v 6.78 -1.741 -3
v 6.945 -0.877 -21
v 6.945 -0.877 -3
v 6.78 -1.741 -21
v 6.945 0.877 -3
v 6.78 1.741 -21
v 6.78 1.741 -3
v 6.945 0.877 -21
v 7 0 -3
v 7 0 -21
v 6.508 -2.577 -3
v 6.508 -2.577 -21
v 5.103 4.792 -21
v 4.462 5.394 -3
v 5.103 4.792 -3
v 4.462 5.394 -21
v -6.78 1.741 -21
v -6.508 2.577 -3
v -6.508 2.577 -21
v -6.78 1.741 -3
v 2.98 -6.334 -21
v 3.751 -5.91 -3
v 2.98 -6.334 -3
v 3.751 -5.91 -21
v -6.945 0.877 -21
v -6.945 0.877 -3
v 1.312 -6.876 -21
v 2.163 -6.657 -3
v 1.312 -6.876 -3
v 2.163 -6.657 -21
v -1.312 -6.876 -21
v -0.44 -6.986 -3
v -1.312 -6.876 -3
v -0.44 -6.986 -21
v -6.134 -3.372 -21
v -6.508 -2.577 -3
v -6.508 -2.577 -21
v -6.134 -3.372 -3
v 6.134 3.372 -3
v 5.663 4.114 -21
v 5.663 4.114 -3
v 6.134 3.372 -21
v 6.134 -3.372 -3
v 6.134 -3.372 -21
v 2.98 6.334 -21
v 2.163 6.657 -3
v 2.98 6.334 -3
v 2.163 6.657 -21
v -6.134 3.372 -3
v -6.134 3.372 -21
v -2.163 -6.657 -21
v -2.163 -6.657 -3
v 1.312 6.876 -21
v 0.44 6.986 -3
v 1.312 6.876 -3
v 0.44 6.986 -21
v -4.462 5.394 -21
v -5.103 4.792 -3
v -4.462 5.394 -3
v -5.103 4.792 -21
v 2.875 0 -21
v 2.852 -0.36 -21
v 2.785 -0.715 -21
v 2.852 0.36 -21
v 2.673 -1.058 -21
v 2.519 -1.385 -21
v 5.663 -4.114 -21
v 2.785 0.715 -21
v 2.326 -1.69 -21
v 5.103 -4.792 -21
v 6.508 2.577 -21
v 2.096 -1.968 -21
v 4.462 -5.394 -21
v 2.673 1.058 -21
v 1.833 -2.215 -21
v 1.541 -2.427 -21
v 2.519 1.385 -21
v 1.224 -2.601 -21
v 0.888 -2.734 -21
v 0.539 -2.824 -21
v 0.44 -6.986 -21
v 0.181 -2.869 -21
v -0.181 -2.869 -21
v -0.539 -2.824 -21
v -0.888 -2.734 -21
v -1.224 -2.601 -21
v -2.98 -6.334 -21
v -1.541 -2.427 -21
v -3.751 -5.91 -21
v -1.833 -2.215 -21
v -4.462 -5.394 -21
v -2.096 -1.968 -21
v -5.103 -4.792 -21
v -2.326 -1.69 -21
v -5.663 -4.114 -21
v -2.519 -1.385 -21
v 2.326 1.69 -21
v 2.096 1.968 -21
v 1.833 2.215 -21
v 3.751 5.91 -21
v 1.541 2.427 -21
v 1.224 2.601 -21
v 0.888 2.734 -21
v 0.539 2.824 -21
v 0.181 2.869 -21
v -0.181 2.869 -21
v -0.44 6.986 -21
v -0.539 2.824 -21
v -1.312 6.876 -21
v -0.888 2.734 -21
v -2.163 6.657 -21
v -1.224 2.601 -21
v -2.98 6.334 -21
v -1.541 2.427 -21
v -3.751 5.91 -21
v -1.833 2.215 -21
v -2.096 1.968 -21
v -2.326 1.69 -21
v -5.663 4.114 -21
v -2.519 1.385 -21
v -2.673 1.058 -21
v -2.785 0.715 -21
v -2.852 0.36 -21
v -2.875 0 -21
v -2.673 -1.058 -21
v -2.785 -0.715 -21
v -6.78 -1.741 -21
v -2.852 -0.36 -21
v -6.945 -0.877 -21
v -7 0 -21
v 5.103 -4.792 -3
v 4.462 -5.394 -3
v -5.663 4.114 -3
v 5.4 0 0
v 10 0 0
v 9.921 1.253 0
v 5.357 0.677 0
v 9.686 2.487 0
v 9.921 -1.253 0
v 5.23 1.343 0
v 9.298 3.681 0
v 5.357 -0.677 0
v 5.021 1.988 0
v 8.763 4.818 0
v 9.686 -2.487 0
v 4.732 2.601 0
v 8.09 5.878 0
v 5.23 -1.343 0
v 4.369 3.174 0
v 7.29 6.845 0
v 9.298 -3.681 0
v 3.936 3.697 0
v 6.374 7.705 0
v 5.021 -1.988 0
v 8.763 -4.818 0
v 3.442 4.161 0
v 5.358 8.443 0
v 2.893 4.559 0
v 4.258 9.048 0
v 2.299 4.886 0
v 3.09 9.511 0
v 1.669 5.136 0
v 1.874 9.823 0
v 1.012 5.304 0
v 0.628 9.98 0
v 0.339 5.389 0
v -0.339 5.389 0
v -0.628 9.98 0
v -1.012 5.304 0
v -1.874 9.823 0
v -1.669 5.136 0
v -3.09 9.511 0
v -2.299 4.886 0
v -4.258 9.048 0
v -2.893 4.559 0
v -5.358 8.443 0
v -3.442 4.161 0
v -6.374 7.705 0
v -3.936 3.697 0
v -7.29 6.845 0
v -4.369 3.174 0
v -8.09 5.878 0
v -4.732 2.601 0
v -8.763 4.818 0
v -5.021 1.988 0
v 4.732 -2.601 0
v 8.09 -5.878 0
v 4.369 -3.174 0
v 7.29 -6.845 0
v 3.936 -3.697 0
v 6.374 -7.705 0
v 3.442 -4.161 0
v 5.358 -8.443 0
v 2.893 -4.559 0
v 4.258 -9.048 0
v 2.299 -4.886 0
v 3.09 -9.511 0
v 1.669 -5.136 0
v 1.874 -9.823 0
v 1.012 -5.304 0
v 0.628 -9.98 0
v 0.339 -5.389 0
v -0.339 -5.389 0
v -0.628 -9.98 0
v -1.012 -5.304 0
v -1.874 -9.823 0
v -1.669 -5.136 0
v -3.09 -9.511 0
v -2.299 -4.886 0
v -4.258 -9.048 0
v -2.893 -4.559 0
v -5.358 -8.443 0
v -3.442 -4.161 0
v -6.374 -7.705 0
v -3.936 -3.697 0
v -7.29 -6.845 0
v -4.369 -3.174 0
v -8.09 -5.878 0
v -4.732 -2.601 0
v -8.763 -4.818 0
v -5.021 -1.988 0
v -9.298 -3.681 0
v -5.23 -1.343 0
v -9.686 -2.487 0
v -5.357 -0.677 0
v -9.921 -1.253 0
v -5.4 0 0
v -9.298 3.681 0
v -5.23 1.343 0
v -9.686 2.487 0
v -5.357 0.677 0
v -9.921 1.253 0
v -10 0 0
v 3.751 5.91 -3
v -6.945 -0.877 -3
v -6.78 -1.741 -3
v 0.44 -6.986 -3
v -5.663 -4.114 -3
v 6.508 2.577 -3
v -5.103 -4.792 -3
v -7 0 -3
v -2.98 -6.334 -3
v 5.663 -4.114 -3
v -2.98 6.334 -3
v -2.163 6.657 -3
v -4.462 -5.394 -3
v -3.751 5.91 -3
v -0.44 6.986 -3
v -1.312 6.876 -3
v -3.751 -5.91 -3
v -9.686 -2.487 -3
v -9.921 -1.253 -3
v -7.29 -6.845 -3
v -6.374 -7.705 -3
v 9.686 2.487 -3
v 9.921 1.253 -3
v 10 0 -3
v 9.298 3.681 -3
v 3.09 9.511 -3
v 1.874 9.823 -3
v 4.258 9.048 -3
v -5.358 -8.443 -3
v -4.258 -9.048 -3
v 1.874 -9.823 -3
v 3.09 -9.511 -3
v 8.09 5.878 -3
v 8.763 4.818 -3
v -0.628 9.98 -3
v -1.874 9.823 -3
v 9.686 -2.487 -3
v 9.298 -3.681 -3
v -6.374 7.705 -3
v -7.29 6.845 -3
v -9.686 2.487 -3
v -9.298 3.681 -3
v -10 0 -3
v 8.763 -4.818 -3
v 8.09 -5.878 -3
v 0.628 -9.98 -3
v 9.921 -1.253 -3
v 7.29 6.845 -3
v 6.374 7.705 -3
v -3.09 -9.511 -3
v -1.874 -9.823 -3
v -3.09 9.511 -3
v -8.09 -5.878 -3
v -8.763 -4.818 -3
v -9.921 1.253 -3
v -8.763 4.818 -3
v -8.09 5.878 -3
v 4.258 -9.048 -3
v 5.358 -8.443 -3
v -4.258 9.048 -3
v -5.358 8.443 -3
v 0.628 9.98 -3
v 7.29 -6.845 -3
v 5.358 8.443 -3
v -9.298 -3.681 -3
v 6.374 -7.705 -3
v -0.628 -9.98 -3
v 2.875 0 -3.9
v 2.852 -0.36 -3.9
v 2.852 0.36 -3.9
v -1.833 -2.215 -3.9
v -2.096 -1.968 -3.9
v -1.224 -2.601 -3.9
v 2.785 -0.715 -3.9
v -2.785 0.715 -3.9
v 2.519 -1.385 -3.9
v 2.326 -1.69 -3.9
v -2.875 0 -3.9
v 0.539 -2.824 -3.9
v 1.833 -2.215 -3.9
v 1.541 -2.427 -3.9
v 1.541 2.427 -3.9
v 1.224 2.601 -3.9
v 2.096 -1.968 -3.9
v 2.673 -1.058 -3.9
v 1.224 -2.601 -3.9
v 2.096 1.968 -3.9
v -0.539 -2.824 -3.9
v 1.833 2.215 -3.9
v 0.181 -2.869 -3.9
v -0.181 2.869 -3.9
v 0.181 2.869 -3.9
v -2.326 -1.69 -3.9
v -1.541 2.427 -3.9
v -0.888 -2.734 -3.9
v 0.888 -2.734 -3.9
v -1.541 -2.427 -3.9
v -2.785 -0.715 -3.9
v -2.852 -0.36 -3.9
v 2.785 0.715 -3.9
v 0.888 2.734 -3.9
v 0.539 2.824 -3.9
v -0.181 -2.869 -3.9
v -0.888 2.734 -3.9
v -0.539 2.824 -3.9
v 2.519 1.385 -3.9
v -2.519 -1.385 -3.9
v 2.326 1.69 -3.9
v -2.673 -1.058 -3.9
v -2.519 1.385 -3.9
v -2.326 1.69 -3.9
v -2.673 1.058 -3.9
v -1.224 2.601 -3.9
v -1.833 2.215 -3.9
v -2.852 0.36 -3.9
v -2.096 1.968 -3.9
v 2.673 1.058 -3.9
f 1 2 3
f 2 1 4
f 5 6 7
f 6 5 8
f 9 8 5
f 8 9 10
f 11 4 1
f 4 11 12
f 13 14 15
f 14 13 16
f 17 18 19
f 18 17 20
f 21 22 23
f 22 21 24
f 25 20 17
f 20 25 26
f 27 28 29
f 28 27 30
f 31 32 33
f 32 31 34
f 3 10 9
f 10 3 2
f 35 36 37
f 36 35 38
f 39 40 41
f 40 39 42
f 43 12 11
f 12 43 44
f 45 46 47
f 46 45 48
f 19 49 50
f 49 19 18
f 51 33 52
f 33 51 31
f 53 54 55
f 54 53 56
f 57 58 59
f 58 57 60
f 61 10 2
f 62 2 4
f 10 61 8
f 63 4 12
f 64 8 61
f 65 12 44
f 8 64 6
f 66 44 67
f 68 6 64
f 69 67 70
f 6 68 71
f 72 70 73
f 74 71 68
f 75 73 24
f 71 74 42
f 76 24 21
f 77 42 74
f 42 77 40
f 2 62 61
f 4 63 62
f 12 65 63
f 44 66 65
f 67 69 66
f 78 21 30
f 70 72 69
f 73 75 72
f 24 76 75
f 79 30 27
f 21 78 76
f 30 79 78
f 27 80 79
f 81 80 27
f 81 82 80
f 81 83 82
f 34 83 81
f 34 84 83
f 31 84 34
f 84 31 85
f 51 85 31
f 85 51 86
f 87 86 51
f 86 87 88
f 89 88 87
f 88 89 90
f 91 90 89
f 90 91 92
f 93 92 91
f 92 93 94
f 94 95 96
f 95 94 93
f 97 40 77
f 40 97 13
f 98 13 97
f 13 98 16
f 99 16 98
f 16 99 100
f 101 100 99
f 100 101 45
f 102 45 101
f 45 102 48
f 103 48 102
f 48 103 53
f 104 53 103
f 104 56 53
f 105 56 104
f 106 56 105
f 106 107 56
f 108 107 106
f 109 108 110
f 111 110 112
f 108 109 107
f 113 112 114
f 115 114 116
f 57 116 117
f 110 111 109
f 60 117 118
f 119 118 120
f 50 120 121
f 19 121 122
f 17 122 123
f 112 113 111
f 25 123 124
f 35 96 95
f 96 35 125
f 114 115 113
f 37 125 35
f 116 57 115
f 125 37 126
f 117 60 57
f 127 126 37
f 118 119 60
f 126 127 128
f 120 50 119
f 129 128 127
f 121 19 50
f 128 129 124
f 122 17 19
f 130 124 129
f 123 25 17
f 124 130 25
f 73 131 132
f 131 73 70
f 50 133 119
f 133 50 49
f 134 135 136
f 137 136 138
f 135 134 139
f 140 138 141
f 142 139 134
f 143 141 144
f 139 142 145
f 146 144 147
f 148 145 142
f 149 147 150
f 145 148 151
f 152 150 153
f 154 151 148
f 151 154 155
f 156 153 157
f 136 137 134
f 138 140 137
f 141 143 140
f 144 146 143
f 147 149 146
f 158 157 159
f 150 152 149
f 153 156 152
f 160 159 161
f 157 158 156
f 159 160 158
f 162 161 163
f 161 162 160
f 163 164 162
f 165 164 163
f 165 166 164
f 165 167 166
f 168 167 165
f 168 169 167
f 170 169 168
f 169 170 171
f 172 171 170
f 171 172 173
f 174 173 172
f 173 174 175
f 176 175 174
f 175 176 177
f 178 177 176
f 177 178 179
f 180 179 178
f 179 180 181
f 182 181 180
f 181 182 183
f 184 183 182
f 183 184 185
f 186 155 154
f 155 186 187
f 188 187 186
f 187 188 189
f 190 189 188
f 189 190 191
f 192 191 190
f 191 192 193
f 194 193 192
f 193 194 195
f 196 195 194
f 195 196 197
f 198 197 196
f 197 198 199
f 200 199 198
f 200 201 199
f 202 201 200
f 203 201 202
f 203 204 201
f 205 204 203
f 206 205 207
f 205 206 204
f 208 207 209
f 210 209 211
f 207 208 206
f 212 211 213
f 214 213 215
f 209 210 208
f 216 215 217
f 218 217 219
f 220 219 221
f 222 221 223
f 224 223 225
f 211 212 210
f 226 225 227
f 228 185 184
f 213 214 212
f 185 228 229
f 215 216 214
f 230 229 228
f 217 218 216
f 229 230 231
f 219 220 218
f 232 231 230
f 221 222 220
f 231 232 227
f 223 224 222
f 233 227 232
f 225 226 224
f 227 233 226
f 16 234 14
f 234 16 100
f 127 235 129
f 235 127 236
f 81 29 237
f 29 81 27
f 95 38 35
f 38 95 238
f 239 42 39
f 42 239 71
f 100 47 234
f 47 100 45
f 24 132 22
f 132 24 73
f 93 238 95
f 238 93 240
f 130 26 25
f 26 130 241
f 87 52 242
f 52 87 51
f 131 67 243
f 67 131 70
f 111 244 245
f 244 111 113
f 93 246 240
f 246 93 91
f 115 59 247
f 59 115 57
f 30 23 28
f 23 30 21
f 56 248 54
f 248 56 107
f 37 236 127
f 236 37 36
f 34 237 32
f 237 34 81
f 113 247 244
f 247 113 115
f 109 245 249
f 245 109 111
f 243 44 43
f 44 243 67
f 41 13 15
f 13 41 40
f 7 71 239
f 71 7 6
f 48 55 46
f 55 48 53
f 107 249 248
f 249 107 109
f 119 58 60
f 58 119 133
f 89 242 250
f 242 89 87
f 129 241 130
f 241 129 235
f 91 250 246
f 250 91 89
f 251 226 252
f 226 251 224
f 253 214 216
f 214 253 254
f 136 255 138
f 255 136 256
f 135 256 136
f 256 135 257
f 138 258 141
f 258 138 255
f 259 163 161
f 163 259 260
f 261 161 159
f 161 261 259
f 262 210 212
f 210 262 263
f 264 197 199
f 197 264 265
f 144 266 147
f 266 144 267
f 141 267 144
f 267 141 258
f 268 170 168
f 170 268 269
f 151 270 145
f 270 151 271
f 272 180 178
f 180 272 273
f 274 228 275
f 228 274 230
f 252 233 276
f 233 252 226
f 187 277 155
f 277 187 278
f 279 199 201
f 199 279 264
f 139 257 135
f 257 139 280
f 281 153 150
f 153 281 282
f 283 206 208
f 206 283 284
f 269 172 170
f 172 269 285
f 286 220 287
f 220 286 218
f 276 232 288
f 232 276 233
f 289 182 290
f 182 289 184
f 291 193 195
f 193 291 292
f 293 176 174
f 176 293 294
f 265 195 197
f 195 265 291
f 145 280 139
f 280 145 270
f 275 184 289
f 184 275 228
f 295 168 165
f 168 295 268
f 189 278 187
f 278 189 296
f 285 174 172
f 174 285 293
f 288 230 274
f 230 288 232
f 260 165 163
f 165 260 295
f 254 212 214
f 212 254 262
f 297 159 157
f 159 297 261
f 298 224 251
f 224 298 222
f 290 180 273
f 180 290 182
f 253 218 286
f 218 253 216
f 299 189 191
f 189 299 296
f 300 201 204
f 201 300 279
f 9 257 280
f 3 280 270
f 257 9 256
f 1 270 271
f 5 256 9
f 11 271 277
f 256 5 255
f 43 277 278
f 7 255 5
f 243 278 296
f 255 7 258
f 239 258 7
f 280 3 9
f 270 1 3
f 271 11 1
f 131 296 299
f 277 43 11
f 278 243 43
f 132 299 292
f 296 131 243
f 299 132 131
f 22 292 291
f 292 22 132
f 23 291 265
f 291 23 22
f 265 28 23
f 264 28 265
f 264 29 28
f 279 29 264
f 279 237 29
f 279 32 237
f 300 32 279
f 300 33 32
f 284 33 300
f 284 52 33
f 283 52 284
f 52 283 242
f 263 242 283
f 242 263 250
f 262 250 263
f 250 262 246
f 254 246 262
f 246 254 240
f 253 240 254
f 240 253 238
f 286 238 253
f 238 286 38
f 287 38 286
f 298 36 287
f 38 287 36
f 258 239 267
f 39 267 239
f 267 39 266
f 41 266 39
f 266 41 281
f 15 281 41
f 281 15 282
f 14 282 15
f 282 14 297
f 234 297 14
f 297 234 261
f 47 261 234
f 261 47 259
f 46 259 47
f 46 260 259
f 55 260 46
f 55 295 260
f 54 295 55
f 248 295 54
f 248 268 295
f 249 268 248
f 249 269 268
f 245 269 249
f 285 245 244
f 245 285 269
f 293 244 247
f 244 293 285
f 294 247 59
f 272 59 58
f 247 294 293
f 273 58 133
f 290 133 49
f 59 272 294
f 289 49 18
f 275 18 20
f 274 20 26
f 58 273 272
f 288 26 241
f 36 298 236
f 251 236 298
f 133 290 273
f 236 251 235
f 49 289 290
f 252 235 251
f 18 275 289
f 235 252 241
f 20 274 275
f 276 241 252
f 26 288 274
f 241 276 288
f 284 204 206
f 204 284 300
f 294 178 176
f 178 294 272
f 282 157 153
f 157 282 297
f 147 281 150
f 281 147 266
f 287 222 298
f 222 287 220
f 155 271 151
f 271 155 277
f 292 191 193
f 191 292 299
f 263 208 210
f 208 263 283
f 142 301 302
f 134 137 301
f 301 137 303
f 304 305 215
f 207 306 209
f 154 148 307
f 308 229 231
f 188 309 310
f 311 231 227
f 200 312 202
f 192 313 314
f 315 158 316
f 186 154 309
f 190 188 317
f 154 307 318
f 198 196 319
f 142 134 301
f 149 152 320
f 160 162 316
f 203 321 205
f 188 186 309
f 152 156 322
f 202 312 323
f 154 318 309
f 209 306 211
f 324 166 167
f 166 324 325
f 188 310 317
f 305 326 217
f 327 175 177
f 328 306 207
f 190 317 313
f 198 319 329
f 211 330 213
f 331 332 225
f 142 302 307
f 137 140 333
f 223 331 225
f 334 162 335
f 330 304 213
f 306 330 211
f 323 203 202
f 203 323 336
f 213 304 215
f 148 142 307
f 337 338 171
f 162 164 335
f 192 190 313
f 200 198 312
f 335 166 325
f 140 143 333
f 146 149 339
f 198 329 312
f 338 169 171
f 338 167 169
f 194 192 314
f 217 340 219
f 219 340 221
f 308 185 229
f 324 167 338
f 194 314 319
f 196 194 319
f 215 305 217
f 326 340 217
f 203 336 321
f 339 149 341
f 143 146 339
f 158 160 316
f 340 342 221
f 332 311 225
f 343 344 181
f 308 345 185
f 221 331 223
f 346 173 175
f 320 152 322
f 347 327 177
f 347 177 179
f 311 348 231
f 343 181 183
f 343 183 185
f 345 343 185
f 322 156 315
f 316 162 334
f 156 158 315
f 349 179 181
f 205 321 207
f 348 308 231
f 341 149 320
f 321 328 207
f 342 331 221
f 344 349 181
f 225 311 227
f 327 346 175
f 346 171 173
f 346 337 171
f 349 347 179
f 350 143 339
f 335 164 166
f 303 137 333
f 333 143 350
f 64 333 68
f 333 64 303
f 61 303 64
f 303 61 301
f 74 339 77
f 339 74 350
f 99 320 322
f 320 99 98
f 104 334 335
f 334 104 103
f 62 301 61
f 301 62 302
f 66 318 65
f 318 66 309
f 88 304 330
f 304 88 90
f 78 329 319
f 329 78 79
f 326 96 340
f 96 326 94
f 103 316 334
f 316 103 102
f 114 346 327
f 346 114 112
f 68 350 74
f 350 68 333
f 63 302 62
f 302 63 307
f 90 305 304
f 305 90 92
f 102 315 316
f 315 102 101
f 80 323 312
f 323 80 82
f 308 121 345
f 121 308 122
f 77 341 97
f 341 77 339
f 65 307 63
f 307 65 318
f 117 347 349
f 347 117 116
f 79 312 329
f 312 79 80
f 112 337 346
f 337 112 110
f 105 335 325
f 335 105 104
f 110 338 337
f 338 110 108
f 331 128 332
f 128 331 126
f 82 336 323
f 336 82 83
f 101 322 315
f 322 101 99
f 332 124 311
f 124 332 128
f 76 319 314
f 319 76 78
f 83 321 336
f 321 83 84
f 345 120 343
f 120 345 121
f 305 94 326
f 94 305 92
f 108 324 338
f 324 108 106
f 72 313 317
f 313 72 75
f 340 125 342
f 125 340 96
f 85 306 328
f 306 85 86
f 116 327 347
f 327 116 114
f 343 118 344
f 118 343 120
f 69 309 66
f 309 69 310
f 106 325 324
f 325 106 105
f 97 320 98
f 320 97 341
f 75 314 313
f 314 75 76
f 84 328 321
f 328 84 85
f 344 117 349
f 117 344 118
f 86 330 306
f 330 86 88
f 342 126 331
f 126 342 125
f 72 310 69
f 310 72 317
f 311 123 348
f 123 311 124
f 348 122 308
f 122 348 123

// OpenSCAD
$fn = 50;


difference() {
	union() {
		translate(v = [0, 0, -21.0000000000]) {
			cylinder(h = 21, r = 7.0000000000);
		}
		translate(v = [0, 0, -3.0000000000]) {
			cylinder(h = 3, r = 10.0000000000);
		}
	}
	union() {
		translate(v = [0, 0, 0]) {
			rotate(a = [0, 0, 0]) {
				difference() {
					union() {
						#translate(v = [0, 0, -21.0000000000]) {
							cylinder(h = 21, r = 2.6000000000);
						}
						#translate(v = [0, 0, -3.9000000000]) {
							cylinder(h = 3.9000000000, r1 = 2.8750000000, r2 = 5.4000000000);
						}
						#translate(v = [0, 0, -21.0000000000]) {
							cylinder(h = 21, r = 2.8750000000);
						}
						#translate(v = [0, 0, -21.0000000000]) {
							cylinder(h = 21, r = 2.6000000000);
						}
					}
					union();
				}
			}
		}
	}
}
